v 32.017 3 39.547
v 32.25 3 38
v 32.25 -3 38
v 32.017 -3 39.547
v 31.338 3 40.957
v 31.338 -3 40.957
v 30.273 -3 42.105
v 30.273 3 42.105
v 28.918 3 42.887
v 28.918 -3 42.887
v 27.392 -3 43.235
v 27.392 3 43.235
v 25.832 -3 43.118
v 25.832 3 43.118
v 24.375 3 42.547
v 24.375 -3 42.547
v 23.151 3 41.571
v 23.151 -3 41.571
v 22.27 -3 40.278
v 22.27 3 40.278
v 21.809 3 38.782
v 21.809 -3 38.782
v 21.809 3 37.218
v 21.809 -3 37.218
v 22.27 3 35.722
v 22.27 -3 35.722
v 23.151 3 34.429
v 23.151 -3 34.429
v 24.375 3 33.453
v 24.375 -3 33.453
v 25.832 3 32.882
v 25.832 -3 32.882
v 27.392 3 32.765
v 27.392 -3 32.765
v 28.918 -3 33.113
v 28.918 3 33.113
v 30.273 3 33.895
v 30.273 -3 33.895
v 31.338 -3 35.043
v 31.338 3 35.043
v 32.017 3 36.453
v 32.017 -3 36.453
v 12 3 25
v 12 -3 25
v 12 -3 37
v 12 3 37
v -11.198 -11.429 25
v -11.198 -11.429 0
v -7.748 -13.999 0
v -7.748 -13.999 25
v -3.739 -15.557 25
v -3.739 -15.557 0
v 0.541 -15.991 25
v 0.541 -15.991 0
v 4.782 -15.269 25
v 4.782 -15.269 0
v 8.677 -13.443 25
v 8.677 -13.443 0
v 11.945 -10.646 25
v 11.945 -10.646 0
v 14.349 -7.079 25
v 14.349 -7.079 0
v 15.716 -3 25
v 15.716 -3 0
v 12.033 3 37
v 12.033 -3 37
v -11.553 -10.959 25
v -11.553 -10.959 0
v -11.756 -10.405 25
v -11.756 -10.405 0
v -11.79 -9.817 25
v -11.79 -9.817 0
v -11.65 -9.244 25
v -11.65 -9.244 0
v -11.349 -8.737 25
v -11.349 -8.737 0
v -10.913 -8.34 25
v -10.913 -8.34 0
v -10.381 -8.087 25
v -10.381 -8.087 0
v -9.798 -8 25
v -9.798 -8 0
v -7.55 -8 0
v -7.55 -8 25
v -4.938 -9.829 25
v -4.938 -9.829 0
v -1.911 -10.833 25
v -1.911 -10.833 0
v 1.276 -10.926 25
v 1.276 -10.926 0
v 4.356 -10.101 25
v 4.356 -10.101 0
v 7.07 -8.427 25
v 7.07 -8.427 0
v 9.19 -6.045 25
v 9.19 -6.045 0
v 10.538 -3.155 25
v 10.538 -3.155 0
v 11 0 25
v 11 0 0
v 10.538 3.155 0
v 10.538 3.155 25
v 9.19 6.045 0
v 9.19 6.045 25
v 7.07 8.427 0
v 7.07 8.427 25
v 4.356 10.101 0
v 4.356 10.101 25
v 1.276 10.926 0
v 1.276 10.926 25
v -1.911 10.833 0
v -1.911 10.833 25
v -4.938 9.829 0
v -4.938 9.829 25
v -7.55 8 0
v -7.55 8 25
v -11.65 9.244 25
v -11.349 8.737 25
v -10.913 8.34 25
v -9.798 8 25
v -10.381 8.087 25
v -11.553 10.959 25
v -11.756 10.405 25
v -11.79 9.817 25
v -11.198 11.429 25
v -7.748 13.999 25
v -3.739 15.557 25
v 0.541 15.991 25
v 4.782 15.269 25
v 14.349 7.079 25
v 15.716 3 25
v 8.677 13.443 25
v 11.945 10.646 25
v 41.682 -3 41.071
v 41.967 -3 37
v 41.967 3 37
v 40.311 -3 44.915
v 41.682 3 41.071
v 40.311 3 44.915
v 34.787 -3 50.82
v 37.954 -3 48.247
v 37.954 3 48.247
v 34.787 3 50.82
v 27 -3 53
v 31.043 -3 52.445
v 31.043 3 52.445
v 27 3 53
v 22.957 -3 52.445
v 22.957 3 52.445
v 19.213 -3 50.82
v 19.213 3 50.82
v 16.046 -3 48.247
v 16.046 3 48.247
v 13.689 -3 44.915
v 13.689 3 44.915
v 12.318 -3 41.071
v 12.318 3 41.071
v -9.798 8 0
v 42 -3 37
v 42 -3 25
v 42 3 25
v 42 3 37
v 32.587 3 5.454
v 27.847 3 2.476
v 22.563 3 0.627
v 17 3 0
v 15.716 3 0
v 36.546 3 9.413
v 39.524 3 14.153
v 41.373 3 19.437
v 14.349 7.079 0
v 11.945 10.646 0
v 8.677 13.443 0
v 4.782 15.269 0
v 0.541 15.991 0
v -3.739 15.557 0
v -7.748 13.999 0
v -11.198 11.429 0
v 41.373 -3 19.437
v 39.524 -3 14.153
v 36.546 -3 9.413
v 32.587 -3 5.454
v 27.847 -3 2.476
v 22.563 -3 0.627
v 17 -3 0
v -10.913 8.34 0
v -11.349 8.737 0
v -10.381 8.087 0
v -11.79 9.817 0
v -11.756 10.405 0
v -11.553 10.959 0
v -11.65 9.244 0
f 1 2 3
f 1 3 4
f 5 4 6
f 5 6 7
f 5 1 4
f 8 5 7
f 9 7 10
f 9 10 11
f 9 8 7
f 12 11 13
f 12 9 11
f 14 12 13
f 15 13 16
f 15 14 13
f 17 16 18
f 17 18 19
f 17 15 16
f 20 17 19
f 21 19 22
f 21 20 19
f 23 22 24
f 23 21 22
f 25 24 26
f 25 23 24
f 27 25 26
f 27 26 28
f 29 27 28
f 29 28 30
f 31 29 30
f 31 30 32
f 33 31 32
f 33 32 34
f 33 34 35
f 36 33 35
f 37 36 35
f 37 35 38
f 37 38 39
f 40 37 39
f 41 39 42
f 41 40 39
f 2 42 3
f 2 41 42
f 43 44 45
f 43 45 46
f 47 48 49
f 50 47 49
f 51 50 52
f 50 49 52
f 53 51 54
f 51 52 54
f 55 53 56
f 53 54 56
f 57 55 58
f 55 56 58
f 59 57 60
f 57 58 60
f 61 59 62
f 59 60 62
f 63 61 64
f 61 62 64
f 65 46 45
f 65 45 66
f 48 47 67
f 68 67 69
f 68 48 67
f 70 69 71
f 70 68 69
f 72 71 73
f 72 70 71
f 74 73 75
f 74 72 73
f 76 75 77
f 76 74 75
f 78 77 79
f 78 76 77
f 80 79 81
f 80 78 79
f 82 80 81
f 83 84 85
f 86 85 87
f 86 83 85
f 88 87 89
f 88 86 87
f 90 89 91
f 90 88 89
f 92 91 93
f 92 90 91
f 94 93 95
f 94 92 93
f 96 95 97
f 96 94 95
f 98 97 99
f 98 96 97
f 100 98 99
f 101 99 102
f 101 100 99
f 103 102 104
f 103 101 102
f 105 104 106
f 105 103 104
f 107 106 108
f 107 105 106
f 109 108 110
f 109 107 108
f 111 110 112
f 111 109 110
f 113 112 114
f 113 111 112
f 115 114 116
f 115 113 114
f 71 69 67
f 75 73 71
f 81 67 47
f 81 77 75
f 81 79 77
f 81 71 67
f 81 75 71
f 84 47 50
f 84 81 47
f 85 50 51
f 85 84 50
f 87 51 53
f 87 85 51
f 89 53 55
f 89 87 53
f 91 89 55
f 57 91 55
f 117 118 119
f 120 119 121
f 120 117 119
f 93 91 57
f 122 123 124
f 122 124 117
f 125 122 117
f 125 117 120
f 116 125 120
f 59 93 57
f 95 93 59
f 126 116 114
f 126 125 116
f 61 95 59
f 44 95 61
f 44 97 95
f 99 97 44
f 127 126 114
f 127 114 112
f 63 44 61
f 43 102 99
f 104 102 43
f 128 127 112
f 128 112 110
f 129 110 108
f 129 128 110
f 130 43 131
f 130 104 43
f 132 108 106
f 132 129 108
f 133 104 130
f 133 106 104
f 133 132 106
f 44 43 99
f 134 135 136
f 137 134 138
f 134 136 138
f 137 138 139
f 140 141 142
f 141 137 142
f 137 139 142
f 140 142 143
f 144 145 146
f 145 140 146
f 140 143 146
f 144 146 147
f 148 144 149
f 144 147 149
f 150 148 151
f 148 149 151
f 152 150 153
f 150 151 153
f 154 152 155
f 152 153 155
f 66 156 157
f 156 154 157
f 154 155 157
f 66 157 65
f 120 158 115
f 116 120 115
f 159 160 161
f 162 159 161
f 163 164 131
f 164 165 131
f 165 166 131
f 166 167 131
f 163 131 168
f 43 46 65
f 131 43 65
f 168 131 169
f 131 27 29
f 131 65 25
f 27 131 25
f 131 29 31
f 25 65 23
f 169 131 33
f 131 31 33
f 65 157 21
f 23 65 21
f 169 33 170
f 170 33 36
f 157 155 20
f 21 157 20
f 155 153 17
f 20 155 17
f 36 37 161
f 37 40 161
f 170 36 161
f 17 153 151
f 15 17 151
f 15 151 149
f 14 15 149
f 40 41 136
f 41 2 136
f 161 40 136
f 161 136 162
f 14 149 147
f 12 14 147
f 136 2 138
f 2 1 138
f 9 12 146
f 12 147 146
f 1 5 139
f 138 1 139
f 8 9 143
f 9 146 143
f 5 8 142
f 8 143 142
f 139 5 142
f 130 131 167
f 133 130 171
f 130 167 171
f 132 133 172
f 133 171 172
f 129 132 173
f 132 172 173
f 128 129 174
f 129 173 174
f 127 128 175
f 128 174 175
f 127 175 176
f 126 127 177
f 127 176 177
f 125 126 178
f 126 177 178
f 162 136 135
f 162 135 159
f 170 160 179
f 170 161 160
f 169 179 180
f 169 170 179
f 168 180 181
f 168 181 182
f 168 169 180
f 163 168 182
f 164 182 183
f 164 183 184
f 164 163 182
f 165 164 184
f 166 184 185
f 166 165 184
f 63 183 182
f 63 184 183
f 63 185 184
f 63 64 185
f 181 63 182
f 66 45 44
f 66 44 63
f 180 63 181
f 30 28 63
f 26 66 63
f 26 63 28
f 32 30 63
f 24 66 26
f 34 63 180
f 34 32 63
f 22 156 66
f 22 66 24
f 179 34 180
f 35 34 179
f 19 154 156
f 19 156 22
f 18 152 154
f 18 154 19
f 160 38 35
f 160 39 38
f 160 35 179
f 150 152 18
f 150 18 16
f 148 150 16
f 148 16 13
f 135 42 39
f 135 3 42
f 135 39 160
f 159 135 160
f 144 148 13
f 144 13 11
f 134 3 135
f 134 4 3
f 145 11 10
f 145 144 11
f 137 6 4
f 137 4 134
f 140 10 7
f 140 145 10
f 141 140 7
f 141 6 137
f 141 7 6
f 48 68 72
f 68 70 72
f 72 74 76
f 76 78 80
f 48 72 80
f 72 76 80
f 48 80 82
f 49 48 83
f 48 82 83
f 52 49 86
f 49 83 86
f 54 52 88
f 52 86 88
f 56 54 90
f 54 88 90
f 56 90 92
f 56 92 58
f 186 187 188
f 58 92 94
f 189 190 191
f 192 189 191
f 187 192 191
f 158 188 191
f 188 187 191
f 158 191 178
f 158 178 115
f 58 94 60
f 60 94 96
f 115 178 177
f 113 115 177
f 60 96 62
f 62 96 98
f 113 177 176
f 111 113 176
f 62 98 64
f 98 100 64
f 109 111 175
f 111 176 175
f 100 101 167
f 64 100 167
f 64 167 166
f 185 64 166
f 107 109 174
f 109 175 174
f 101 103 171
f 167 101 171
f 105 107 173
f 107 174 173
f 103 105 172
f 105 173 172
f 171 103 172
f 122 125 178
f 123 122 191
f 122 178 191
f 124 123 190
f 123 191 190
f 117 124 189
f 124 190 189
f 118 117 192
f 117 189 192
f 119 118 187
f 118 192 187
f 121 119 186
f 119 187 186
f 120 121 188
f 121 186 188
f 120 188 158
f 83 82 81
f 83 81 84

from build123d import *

# Parameters (mm, degrees)
CYLINDER003_R     = 5.25
CYLINDER003_DEPTH = 6
CYLINDER002_R     = 15
CYLINDER002_DEPTH = 6
BOX_W             = 30
BOX_H             = 6
BOX_DEPTH         = 37
FILLET001_R       = 25
BOX001_W          = 30
BOX001_H          = 16
BOX001_DEPTH      = 37
CYLINDER_R        = 11
CYLINDER_DEPTH    = 25
CYLINDER001_R     = 16
CYLINDER001_DEPTH = 25
FILLET_R          = 2


with BuildPart() as cilindro003:
    # Cylinder003 → Cylinder003 (new body)
    with BuildSketch(Plane(origin=(27, 3, 38), x_dir=(1, 0, 0), z_dir=(0, -1, 0))):
        Circle(CYLINDER003_R)
    extrude(amount=CYLINDER003_DEPTH)


with BuildPart() as cilindro002:
    # Cylinder002 → Cylinder002 (new body)
    with BuildSketch(Plane(origin=(27, 3, 38), x_dir=(1, 0, 0), z_dir=(0, -1, 0))):
        Circle(CYLINDER002_R)
    extrude(amount=CYLINDER002_DEPTH)


with BuildPart() as fillet001:
    # Box → Box (new body)
    with BuildSketch(Plane(origin=(12, -3, 0), x_dir=(1, 0, 0), z_dir=(0, 0, 1))):
        with Locations((15, 3)):
            Rectangle(BOX_W, BOX_H)
    extrude(amount=BOX_DEPTH)

    # Fusion: union Cilindro002
    add(cilindro002.part)

    # Cut001: cut Cilindro003
    add(cilindro003.part, mode=Mode.SUBTRACT)

    # Fillet001
    fillet001_edges = [fillet001.edges().sort_by_distance(p)[0] for p in [
        (42, 0, 0),
    ]]
    fillet(fillet001_edges, radius=FILLET001_R)


with BuildPart() as cubo001:
    # Box001 → Box001 (new body)
    with BuildSketch(Plane(origin=(-24, -8, 0), x_dir=(1, 0, 0), z_dir=(0, 0, 1))):
        with Locations((15, 8)):
            Rectangle(BOX001_W, BOX001_H)
    extrude(amount=BOX001_DEPTH)


with BuildPart() as cilindro:
    # Cylinder → Cylinder (new body)
    with BuildSketch(Plane.XY):
        Circle(CYLINDER_R)
    extrude(amount=CYLINDER_DEPTH)


with BuildPart() as fusion001:
    # Cylinder001 → Cylinder001 (new body)
    with BuildSketch(Plane.XY):
        Circle(CYLINDER001_R)
    extrude(amount=CYLINDER001_DEPTH)

    # Cut: cut Cilindro
    add(cilindro.part, mode=Mode.SUBTRACT)

    # Cut002: cut Cubo001
    add(cubo001.part, mode=Mode.SUBTRACT)

    # Fillet
    fillet_edges = [fusion001.edges().sort_by_distance(p)[0] for p in [
        (-13.856406, -8, 12.5),
        (-13.856406, 8, 12.5),
    ]]
    fillet(fillet_edges, radius=FILLET_R)

    # Fusion001: union Fillet001
    add(fillet001.part)


solid = fusion001.part
